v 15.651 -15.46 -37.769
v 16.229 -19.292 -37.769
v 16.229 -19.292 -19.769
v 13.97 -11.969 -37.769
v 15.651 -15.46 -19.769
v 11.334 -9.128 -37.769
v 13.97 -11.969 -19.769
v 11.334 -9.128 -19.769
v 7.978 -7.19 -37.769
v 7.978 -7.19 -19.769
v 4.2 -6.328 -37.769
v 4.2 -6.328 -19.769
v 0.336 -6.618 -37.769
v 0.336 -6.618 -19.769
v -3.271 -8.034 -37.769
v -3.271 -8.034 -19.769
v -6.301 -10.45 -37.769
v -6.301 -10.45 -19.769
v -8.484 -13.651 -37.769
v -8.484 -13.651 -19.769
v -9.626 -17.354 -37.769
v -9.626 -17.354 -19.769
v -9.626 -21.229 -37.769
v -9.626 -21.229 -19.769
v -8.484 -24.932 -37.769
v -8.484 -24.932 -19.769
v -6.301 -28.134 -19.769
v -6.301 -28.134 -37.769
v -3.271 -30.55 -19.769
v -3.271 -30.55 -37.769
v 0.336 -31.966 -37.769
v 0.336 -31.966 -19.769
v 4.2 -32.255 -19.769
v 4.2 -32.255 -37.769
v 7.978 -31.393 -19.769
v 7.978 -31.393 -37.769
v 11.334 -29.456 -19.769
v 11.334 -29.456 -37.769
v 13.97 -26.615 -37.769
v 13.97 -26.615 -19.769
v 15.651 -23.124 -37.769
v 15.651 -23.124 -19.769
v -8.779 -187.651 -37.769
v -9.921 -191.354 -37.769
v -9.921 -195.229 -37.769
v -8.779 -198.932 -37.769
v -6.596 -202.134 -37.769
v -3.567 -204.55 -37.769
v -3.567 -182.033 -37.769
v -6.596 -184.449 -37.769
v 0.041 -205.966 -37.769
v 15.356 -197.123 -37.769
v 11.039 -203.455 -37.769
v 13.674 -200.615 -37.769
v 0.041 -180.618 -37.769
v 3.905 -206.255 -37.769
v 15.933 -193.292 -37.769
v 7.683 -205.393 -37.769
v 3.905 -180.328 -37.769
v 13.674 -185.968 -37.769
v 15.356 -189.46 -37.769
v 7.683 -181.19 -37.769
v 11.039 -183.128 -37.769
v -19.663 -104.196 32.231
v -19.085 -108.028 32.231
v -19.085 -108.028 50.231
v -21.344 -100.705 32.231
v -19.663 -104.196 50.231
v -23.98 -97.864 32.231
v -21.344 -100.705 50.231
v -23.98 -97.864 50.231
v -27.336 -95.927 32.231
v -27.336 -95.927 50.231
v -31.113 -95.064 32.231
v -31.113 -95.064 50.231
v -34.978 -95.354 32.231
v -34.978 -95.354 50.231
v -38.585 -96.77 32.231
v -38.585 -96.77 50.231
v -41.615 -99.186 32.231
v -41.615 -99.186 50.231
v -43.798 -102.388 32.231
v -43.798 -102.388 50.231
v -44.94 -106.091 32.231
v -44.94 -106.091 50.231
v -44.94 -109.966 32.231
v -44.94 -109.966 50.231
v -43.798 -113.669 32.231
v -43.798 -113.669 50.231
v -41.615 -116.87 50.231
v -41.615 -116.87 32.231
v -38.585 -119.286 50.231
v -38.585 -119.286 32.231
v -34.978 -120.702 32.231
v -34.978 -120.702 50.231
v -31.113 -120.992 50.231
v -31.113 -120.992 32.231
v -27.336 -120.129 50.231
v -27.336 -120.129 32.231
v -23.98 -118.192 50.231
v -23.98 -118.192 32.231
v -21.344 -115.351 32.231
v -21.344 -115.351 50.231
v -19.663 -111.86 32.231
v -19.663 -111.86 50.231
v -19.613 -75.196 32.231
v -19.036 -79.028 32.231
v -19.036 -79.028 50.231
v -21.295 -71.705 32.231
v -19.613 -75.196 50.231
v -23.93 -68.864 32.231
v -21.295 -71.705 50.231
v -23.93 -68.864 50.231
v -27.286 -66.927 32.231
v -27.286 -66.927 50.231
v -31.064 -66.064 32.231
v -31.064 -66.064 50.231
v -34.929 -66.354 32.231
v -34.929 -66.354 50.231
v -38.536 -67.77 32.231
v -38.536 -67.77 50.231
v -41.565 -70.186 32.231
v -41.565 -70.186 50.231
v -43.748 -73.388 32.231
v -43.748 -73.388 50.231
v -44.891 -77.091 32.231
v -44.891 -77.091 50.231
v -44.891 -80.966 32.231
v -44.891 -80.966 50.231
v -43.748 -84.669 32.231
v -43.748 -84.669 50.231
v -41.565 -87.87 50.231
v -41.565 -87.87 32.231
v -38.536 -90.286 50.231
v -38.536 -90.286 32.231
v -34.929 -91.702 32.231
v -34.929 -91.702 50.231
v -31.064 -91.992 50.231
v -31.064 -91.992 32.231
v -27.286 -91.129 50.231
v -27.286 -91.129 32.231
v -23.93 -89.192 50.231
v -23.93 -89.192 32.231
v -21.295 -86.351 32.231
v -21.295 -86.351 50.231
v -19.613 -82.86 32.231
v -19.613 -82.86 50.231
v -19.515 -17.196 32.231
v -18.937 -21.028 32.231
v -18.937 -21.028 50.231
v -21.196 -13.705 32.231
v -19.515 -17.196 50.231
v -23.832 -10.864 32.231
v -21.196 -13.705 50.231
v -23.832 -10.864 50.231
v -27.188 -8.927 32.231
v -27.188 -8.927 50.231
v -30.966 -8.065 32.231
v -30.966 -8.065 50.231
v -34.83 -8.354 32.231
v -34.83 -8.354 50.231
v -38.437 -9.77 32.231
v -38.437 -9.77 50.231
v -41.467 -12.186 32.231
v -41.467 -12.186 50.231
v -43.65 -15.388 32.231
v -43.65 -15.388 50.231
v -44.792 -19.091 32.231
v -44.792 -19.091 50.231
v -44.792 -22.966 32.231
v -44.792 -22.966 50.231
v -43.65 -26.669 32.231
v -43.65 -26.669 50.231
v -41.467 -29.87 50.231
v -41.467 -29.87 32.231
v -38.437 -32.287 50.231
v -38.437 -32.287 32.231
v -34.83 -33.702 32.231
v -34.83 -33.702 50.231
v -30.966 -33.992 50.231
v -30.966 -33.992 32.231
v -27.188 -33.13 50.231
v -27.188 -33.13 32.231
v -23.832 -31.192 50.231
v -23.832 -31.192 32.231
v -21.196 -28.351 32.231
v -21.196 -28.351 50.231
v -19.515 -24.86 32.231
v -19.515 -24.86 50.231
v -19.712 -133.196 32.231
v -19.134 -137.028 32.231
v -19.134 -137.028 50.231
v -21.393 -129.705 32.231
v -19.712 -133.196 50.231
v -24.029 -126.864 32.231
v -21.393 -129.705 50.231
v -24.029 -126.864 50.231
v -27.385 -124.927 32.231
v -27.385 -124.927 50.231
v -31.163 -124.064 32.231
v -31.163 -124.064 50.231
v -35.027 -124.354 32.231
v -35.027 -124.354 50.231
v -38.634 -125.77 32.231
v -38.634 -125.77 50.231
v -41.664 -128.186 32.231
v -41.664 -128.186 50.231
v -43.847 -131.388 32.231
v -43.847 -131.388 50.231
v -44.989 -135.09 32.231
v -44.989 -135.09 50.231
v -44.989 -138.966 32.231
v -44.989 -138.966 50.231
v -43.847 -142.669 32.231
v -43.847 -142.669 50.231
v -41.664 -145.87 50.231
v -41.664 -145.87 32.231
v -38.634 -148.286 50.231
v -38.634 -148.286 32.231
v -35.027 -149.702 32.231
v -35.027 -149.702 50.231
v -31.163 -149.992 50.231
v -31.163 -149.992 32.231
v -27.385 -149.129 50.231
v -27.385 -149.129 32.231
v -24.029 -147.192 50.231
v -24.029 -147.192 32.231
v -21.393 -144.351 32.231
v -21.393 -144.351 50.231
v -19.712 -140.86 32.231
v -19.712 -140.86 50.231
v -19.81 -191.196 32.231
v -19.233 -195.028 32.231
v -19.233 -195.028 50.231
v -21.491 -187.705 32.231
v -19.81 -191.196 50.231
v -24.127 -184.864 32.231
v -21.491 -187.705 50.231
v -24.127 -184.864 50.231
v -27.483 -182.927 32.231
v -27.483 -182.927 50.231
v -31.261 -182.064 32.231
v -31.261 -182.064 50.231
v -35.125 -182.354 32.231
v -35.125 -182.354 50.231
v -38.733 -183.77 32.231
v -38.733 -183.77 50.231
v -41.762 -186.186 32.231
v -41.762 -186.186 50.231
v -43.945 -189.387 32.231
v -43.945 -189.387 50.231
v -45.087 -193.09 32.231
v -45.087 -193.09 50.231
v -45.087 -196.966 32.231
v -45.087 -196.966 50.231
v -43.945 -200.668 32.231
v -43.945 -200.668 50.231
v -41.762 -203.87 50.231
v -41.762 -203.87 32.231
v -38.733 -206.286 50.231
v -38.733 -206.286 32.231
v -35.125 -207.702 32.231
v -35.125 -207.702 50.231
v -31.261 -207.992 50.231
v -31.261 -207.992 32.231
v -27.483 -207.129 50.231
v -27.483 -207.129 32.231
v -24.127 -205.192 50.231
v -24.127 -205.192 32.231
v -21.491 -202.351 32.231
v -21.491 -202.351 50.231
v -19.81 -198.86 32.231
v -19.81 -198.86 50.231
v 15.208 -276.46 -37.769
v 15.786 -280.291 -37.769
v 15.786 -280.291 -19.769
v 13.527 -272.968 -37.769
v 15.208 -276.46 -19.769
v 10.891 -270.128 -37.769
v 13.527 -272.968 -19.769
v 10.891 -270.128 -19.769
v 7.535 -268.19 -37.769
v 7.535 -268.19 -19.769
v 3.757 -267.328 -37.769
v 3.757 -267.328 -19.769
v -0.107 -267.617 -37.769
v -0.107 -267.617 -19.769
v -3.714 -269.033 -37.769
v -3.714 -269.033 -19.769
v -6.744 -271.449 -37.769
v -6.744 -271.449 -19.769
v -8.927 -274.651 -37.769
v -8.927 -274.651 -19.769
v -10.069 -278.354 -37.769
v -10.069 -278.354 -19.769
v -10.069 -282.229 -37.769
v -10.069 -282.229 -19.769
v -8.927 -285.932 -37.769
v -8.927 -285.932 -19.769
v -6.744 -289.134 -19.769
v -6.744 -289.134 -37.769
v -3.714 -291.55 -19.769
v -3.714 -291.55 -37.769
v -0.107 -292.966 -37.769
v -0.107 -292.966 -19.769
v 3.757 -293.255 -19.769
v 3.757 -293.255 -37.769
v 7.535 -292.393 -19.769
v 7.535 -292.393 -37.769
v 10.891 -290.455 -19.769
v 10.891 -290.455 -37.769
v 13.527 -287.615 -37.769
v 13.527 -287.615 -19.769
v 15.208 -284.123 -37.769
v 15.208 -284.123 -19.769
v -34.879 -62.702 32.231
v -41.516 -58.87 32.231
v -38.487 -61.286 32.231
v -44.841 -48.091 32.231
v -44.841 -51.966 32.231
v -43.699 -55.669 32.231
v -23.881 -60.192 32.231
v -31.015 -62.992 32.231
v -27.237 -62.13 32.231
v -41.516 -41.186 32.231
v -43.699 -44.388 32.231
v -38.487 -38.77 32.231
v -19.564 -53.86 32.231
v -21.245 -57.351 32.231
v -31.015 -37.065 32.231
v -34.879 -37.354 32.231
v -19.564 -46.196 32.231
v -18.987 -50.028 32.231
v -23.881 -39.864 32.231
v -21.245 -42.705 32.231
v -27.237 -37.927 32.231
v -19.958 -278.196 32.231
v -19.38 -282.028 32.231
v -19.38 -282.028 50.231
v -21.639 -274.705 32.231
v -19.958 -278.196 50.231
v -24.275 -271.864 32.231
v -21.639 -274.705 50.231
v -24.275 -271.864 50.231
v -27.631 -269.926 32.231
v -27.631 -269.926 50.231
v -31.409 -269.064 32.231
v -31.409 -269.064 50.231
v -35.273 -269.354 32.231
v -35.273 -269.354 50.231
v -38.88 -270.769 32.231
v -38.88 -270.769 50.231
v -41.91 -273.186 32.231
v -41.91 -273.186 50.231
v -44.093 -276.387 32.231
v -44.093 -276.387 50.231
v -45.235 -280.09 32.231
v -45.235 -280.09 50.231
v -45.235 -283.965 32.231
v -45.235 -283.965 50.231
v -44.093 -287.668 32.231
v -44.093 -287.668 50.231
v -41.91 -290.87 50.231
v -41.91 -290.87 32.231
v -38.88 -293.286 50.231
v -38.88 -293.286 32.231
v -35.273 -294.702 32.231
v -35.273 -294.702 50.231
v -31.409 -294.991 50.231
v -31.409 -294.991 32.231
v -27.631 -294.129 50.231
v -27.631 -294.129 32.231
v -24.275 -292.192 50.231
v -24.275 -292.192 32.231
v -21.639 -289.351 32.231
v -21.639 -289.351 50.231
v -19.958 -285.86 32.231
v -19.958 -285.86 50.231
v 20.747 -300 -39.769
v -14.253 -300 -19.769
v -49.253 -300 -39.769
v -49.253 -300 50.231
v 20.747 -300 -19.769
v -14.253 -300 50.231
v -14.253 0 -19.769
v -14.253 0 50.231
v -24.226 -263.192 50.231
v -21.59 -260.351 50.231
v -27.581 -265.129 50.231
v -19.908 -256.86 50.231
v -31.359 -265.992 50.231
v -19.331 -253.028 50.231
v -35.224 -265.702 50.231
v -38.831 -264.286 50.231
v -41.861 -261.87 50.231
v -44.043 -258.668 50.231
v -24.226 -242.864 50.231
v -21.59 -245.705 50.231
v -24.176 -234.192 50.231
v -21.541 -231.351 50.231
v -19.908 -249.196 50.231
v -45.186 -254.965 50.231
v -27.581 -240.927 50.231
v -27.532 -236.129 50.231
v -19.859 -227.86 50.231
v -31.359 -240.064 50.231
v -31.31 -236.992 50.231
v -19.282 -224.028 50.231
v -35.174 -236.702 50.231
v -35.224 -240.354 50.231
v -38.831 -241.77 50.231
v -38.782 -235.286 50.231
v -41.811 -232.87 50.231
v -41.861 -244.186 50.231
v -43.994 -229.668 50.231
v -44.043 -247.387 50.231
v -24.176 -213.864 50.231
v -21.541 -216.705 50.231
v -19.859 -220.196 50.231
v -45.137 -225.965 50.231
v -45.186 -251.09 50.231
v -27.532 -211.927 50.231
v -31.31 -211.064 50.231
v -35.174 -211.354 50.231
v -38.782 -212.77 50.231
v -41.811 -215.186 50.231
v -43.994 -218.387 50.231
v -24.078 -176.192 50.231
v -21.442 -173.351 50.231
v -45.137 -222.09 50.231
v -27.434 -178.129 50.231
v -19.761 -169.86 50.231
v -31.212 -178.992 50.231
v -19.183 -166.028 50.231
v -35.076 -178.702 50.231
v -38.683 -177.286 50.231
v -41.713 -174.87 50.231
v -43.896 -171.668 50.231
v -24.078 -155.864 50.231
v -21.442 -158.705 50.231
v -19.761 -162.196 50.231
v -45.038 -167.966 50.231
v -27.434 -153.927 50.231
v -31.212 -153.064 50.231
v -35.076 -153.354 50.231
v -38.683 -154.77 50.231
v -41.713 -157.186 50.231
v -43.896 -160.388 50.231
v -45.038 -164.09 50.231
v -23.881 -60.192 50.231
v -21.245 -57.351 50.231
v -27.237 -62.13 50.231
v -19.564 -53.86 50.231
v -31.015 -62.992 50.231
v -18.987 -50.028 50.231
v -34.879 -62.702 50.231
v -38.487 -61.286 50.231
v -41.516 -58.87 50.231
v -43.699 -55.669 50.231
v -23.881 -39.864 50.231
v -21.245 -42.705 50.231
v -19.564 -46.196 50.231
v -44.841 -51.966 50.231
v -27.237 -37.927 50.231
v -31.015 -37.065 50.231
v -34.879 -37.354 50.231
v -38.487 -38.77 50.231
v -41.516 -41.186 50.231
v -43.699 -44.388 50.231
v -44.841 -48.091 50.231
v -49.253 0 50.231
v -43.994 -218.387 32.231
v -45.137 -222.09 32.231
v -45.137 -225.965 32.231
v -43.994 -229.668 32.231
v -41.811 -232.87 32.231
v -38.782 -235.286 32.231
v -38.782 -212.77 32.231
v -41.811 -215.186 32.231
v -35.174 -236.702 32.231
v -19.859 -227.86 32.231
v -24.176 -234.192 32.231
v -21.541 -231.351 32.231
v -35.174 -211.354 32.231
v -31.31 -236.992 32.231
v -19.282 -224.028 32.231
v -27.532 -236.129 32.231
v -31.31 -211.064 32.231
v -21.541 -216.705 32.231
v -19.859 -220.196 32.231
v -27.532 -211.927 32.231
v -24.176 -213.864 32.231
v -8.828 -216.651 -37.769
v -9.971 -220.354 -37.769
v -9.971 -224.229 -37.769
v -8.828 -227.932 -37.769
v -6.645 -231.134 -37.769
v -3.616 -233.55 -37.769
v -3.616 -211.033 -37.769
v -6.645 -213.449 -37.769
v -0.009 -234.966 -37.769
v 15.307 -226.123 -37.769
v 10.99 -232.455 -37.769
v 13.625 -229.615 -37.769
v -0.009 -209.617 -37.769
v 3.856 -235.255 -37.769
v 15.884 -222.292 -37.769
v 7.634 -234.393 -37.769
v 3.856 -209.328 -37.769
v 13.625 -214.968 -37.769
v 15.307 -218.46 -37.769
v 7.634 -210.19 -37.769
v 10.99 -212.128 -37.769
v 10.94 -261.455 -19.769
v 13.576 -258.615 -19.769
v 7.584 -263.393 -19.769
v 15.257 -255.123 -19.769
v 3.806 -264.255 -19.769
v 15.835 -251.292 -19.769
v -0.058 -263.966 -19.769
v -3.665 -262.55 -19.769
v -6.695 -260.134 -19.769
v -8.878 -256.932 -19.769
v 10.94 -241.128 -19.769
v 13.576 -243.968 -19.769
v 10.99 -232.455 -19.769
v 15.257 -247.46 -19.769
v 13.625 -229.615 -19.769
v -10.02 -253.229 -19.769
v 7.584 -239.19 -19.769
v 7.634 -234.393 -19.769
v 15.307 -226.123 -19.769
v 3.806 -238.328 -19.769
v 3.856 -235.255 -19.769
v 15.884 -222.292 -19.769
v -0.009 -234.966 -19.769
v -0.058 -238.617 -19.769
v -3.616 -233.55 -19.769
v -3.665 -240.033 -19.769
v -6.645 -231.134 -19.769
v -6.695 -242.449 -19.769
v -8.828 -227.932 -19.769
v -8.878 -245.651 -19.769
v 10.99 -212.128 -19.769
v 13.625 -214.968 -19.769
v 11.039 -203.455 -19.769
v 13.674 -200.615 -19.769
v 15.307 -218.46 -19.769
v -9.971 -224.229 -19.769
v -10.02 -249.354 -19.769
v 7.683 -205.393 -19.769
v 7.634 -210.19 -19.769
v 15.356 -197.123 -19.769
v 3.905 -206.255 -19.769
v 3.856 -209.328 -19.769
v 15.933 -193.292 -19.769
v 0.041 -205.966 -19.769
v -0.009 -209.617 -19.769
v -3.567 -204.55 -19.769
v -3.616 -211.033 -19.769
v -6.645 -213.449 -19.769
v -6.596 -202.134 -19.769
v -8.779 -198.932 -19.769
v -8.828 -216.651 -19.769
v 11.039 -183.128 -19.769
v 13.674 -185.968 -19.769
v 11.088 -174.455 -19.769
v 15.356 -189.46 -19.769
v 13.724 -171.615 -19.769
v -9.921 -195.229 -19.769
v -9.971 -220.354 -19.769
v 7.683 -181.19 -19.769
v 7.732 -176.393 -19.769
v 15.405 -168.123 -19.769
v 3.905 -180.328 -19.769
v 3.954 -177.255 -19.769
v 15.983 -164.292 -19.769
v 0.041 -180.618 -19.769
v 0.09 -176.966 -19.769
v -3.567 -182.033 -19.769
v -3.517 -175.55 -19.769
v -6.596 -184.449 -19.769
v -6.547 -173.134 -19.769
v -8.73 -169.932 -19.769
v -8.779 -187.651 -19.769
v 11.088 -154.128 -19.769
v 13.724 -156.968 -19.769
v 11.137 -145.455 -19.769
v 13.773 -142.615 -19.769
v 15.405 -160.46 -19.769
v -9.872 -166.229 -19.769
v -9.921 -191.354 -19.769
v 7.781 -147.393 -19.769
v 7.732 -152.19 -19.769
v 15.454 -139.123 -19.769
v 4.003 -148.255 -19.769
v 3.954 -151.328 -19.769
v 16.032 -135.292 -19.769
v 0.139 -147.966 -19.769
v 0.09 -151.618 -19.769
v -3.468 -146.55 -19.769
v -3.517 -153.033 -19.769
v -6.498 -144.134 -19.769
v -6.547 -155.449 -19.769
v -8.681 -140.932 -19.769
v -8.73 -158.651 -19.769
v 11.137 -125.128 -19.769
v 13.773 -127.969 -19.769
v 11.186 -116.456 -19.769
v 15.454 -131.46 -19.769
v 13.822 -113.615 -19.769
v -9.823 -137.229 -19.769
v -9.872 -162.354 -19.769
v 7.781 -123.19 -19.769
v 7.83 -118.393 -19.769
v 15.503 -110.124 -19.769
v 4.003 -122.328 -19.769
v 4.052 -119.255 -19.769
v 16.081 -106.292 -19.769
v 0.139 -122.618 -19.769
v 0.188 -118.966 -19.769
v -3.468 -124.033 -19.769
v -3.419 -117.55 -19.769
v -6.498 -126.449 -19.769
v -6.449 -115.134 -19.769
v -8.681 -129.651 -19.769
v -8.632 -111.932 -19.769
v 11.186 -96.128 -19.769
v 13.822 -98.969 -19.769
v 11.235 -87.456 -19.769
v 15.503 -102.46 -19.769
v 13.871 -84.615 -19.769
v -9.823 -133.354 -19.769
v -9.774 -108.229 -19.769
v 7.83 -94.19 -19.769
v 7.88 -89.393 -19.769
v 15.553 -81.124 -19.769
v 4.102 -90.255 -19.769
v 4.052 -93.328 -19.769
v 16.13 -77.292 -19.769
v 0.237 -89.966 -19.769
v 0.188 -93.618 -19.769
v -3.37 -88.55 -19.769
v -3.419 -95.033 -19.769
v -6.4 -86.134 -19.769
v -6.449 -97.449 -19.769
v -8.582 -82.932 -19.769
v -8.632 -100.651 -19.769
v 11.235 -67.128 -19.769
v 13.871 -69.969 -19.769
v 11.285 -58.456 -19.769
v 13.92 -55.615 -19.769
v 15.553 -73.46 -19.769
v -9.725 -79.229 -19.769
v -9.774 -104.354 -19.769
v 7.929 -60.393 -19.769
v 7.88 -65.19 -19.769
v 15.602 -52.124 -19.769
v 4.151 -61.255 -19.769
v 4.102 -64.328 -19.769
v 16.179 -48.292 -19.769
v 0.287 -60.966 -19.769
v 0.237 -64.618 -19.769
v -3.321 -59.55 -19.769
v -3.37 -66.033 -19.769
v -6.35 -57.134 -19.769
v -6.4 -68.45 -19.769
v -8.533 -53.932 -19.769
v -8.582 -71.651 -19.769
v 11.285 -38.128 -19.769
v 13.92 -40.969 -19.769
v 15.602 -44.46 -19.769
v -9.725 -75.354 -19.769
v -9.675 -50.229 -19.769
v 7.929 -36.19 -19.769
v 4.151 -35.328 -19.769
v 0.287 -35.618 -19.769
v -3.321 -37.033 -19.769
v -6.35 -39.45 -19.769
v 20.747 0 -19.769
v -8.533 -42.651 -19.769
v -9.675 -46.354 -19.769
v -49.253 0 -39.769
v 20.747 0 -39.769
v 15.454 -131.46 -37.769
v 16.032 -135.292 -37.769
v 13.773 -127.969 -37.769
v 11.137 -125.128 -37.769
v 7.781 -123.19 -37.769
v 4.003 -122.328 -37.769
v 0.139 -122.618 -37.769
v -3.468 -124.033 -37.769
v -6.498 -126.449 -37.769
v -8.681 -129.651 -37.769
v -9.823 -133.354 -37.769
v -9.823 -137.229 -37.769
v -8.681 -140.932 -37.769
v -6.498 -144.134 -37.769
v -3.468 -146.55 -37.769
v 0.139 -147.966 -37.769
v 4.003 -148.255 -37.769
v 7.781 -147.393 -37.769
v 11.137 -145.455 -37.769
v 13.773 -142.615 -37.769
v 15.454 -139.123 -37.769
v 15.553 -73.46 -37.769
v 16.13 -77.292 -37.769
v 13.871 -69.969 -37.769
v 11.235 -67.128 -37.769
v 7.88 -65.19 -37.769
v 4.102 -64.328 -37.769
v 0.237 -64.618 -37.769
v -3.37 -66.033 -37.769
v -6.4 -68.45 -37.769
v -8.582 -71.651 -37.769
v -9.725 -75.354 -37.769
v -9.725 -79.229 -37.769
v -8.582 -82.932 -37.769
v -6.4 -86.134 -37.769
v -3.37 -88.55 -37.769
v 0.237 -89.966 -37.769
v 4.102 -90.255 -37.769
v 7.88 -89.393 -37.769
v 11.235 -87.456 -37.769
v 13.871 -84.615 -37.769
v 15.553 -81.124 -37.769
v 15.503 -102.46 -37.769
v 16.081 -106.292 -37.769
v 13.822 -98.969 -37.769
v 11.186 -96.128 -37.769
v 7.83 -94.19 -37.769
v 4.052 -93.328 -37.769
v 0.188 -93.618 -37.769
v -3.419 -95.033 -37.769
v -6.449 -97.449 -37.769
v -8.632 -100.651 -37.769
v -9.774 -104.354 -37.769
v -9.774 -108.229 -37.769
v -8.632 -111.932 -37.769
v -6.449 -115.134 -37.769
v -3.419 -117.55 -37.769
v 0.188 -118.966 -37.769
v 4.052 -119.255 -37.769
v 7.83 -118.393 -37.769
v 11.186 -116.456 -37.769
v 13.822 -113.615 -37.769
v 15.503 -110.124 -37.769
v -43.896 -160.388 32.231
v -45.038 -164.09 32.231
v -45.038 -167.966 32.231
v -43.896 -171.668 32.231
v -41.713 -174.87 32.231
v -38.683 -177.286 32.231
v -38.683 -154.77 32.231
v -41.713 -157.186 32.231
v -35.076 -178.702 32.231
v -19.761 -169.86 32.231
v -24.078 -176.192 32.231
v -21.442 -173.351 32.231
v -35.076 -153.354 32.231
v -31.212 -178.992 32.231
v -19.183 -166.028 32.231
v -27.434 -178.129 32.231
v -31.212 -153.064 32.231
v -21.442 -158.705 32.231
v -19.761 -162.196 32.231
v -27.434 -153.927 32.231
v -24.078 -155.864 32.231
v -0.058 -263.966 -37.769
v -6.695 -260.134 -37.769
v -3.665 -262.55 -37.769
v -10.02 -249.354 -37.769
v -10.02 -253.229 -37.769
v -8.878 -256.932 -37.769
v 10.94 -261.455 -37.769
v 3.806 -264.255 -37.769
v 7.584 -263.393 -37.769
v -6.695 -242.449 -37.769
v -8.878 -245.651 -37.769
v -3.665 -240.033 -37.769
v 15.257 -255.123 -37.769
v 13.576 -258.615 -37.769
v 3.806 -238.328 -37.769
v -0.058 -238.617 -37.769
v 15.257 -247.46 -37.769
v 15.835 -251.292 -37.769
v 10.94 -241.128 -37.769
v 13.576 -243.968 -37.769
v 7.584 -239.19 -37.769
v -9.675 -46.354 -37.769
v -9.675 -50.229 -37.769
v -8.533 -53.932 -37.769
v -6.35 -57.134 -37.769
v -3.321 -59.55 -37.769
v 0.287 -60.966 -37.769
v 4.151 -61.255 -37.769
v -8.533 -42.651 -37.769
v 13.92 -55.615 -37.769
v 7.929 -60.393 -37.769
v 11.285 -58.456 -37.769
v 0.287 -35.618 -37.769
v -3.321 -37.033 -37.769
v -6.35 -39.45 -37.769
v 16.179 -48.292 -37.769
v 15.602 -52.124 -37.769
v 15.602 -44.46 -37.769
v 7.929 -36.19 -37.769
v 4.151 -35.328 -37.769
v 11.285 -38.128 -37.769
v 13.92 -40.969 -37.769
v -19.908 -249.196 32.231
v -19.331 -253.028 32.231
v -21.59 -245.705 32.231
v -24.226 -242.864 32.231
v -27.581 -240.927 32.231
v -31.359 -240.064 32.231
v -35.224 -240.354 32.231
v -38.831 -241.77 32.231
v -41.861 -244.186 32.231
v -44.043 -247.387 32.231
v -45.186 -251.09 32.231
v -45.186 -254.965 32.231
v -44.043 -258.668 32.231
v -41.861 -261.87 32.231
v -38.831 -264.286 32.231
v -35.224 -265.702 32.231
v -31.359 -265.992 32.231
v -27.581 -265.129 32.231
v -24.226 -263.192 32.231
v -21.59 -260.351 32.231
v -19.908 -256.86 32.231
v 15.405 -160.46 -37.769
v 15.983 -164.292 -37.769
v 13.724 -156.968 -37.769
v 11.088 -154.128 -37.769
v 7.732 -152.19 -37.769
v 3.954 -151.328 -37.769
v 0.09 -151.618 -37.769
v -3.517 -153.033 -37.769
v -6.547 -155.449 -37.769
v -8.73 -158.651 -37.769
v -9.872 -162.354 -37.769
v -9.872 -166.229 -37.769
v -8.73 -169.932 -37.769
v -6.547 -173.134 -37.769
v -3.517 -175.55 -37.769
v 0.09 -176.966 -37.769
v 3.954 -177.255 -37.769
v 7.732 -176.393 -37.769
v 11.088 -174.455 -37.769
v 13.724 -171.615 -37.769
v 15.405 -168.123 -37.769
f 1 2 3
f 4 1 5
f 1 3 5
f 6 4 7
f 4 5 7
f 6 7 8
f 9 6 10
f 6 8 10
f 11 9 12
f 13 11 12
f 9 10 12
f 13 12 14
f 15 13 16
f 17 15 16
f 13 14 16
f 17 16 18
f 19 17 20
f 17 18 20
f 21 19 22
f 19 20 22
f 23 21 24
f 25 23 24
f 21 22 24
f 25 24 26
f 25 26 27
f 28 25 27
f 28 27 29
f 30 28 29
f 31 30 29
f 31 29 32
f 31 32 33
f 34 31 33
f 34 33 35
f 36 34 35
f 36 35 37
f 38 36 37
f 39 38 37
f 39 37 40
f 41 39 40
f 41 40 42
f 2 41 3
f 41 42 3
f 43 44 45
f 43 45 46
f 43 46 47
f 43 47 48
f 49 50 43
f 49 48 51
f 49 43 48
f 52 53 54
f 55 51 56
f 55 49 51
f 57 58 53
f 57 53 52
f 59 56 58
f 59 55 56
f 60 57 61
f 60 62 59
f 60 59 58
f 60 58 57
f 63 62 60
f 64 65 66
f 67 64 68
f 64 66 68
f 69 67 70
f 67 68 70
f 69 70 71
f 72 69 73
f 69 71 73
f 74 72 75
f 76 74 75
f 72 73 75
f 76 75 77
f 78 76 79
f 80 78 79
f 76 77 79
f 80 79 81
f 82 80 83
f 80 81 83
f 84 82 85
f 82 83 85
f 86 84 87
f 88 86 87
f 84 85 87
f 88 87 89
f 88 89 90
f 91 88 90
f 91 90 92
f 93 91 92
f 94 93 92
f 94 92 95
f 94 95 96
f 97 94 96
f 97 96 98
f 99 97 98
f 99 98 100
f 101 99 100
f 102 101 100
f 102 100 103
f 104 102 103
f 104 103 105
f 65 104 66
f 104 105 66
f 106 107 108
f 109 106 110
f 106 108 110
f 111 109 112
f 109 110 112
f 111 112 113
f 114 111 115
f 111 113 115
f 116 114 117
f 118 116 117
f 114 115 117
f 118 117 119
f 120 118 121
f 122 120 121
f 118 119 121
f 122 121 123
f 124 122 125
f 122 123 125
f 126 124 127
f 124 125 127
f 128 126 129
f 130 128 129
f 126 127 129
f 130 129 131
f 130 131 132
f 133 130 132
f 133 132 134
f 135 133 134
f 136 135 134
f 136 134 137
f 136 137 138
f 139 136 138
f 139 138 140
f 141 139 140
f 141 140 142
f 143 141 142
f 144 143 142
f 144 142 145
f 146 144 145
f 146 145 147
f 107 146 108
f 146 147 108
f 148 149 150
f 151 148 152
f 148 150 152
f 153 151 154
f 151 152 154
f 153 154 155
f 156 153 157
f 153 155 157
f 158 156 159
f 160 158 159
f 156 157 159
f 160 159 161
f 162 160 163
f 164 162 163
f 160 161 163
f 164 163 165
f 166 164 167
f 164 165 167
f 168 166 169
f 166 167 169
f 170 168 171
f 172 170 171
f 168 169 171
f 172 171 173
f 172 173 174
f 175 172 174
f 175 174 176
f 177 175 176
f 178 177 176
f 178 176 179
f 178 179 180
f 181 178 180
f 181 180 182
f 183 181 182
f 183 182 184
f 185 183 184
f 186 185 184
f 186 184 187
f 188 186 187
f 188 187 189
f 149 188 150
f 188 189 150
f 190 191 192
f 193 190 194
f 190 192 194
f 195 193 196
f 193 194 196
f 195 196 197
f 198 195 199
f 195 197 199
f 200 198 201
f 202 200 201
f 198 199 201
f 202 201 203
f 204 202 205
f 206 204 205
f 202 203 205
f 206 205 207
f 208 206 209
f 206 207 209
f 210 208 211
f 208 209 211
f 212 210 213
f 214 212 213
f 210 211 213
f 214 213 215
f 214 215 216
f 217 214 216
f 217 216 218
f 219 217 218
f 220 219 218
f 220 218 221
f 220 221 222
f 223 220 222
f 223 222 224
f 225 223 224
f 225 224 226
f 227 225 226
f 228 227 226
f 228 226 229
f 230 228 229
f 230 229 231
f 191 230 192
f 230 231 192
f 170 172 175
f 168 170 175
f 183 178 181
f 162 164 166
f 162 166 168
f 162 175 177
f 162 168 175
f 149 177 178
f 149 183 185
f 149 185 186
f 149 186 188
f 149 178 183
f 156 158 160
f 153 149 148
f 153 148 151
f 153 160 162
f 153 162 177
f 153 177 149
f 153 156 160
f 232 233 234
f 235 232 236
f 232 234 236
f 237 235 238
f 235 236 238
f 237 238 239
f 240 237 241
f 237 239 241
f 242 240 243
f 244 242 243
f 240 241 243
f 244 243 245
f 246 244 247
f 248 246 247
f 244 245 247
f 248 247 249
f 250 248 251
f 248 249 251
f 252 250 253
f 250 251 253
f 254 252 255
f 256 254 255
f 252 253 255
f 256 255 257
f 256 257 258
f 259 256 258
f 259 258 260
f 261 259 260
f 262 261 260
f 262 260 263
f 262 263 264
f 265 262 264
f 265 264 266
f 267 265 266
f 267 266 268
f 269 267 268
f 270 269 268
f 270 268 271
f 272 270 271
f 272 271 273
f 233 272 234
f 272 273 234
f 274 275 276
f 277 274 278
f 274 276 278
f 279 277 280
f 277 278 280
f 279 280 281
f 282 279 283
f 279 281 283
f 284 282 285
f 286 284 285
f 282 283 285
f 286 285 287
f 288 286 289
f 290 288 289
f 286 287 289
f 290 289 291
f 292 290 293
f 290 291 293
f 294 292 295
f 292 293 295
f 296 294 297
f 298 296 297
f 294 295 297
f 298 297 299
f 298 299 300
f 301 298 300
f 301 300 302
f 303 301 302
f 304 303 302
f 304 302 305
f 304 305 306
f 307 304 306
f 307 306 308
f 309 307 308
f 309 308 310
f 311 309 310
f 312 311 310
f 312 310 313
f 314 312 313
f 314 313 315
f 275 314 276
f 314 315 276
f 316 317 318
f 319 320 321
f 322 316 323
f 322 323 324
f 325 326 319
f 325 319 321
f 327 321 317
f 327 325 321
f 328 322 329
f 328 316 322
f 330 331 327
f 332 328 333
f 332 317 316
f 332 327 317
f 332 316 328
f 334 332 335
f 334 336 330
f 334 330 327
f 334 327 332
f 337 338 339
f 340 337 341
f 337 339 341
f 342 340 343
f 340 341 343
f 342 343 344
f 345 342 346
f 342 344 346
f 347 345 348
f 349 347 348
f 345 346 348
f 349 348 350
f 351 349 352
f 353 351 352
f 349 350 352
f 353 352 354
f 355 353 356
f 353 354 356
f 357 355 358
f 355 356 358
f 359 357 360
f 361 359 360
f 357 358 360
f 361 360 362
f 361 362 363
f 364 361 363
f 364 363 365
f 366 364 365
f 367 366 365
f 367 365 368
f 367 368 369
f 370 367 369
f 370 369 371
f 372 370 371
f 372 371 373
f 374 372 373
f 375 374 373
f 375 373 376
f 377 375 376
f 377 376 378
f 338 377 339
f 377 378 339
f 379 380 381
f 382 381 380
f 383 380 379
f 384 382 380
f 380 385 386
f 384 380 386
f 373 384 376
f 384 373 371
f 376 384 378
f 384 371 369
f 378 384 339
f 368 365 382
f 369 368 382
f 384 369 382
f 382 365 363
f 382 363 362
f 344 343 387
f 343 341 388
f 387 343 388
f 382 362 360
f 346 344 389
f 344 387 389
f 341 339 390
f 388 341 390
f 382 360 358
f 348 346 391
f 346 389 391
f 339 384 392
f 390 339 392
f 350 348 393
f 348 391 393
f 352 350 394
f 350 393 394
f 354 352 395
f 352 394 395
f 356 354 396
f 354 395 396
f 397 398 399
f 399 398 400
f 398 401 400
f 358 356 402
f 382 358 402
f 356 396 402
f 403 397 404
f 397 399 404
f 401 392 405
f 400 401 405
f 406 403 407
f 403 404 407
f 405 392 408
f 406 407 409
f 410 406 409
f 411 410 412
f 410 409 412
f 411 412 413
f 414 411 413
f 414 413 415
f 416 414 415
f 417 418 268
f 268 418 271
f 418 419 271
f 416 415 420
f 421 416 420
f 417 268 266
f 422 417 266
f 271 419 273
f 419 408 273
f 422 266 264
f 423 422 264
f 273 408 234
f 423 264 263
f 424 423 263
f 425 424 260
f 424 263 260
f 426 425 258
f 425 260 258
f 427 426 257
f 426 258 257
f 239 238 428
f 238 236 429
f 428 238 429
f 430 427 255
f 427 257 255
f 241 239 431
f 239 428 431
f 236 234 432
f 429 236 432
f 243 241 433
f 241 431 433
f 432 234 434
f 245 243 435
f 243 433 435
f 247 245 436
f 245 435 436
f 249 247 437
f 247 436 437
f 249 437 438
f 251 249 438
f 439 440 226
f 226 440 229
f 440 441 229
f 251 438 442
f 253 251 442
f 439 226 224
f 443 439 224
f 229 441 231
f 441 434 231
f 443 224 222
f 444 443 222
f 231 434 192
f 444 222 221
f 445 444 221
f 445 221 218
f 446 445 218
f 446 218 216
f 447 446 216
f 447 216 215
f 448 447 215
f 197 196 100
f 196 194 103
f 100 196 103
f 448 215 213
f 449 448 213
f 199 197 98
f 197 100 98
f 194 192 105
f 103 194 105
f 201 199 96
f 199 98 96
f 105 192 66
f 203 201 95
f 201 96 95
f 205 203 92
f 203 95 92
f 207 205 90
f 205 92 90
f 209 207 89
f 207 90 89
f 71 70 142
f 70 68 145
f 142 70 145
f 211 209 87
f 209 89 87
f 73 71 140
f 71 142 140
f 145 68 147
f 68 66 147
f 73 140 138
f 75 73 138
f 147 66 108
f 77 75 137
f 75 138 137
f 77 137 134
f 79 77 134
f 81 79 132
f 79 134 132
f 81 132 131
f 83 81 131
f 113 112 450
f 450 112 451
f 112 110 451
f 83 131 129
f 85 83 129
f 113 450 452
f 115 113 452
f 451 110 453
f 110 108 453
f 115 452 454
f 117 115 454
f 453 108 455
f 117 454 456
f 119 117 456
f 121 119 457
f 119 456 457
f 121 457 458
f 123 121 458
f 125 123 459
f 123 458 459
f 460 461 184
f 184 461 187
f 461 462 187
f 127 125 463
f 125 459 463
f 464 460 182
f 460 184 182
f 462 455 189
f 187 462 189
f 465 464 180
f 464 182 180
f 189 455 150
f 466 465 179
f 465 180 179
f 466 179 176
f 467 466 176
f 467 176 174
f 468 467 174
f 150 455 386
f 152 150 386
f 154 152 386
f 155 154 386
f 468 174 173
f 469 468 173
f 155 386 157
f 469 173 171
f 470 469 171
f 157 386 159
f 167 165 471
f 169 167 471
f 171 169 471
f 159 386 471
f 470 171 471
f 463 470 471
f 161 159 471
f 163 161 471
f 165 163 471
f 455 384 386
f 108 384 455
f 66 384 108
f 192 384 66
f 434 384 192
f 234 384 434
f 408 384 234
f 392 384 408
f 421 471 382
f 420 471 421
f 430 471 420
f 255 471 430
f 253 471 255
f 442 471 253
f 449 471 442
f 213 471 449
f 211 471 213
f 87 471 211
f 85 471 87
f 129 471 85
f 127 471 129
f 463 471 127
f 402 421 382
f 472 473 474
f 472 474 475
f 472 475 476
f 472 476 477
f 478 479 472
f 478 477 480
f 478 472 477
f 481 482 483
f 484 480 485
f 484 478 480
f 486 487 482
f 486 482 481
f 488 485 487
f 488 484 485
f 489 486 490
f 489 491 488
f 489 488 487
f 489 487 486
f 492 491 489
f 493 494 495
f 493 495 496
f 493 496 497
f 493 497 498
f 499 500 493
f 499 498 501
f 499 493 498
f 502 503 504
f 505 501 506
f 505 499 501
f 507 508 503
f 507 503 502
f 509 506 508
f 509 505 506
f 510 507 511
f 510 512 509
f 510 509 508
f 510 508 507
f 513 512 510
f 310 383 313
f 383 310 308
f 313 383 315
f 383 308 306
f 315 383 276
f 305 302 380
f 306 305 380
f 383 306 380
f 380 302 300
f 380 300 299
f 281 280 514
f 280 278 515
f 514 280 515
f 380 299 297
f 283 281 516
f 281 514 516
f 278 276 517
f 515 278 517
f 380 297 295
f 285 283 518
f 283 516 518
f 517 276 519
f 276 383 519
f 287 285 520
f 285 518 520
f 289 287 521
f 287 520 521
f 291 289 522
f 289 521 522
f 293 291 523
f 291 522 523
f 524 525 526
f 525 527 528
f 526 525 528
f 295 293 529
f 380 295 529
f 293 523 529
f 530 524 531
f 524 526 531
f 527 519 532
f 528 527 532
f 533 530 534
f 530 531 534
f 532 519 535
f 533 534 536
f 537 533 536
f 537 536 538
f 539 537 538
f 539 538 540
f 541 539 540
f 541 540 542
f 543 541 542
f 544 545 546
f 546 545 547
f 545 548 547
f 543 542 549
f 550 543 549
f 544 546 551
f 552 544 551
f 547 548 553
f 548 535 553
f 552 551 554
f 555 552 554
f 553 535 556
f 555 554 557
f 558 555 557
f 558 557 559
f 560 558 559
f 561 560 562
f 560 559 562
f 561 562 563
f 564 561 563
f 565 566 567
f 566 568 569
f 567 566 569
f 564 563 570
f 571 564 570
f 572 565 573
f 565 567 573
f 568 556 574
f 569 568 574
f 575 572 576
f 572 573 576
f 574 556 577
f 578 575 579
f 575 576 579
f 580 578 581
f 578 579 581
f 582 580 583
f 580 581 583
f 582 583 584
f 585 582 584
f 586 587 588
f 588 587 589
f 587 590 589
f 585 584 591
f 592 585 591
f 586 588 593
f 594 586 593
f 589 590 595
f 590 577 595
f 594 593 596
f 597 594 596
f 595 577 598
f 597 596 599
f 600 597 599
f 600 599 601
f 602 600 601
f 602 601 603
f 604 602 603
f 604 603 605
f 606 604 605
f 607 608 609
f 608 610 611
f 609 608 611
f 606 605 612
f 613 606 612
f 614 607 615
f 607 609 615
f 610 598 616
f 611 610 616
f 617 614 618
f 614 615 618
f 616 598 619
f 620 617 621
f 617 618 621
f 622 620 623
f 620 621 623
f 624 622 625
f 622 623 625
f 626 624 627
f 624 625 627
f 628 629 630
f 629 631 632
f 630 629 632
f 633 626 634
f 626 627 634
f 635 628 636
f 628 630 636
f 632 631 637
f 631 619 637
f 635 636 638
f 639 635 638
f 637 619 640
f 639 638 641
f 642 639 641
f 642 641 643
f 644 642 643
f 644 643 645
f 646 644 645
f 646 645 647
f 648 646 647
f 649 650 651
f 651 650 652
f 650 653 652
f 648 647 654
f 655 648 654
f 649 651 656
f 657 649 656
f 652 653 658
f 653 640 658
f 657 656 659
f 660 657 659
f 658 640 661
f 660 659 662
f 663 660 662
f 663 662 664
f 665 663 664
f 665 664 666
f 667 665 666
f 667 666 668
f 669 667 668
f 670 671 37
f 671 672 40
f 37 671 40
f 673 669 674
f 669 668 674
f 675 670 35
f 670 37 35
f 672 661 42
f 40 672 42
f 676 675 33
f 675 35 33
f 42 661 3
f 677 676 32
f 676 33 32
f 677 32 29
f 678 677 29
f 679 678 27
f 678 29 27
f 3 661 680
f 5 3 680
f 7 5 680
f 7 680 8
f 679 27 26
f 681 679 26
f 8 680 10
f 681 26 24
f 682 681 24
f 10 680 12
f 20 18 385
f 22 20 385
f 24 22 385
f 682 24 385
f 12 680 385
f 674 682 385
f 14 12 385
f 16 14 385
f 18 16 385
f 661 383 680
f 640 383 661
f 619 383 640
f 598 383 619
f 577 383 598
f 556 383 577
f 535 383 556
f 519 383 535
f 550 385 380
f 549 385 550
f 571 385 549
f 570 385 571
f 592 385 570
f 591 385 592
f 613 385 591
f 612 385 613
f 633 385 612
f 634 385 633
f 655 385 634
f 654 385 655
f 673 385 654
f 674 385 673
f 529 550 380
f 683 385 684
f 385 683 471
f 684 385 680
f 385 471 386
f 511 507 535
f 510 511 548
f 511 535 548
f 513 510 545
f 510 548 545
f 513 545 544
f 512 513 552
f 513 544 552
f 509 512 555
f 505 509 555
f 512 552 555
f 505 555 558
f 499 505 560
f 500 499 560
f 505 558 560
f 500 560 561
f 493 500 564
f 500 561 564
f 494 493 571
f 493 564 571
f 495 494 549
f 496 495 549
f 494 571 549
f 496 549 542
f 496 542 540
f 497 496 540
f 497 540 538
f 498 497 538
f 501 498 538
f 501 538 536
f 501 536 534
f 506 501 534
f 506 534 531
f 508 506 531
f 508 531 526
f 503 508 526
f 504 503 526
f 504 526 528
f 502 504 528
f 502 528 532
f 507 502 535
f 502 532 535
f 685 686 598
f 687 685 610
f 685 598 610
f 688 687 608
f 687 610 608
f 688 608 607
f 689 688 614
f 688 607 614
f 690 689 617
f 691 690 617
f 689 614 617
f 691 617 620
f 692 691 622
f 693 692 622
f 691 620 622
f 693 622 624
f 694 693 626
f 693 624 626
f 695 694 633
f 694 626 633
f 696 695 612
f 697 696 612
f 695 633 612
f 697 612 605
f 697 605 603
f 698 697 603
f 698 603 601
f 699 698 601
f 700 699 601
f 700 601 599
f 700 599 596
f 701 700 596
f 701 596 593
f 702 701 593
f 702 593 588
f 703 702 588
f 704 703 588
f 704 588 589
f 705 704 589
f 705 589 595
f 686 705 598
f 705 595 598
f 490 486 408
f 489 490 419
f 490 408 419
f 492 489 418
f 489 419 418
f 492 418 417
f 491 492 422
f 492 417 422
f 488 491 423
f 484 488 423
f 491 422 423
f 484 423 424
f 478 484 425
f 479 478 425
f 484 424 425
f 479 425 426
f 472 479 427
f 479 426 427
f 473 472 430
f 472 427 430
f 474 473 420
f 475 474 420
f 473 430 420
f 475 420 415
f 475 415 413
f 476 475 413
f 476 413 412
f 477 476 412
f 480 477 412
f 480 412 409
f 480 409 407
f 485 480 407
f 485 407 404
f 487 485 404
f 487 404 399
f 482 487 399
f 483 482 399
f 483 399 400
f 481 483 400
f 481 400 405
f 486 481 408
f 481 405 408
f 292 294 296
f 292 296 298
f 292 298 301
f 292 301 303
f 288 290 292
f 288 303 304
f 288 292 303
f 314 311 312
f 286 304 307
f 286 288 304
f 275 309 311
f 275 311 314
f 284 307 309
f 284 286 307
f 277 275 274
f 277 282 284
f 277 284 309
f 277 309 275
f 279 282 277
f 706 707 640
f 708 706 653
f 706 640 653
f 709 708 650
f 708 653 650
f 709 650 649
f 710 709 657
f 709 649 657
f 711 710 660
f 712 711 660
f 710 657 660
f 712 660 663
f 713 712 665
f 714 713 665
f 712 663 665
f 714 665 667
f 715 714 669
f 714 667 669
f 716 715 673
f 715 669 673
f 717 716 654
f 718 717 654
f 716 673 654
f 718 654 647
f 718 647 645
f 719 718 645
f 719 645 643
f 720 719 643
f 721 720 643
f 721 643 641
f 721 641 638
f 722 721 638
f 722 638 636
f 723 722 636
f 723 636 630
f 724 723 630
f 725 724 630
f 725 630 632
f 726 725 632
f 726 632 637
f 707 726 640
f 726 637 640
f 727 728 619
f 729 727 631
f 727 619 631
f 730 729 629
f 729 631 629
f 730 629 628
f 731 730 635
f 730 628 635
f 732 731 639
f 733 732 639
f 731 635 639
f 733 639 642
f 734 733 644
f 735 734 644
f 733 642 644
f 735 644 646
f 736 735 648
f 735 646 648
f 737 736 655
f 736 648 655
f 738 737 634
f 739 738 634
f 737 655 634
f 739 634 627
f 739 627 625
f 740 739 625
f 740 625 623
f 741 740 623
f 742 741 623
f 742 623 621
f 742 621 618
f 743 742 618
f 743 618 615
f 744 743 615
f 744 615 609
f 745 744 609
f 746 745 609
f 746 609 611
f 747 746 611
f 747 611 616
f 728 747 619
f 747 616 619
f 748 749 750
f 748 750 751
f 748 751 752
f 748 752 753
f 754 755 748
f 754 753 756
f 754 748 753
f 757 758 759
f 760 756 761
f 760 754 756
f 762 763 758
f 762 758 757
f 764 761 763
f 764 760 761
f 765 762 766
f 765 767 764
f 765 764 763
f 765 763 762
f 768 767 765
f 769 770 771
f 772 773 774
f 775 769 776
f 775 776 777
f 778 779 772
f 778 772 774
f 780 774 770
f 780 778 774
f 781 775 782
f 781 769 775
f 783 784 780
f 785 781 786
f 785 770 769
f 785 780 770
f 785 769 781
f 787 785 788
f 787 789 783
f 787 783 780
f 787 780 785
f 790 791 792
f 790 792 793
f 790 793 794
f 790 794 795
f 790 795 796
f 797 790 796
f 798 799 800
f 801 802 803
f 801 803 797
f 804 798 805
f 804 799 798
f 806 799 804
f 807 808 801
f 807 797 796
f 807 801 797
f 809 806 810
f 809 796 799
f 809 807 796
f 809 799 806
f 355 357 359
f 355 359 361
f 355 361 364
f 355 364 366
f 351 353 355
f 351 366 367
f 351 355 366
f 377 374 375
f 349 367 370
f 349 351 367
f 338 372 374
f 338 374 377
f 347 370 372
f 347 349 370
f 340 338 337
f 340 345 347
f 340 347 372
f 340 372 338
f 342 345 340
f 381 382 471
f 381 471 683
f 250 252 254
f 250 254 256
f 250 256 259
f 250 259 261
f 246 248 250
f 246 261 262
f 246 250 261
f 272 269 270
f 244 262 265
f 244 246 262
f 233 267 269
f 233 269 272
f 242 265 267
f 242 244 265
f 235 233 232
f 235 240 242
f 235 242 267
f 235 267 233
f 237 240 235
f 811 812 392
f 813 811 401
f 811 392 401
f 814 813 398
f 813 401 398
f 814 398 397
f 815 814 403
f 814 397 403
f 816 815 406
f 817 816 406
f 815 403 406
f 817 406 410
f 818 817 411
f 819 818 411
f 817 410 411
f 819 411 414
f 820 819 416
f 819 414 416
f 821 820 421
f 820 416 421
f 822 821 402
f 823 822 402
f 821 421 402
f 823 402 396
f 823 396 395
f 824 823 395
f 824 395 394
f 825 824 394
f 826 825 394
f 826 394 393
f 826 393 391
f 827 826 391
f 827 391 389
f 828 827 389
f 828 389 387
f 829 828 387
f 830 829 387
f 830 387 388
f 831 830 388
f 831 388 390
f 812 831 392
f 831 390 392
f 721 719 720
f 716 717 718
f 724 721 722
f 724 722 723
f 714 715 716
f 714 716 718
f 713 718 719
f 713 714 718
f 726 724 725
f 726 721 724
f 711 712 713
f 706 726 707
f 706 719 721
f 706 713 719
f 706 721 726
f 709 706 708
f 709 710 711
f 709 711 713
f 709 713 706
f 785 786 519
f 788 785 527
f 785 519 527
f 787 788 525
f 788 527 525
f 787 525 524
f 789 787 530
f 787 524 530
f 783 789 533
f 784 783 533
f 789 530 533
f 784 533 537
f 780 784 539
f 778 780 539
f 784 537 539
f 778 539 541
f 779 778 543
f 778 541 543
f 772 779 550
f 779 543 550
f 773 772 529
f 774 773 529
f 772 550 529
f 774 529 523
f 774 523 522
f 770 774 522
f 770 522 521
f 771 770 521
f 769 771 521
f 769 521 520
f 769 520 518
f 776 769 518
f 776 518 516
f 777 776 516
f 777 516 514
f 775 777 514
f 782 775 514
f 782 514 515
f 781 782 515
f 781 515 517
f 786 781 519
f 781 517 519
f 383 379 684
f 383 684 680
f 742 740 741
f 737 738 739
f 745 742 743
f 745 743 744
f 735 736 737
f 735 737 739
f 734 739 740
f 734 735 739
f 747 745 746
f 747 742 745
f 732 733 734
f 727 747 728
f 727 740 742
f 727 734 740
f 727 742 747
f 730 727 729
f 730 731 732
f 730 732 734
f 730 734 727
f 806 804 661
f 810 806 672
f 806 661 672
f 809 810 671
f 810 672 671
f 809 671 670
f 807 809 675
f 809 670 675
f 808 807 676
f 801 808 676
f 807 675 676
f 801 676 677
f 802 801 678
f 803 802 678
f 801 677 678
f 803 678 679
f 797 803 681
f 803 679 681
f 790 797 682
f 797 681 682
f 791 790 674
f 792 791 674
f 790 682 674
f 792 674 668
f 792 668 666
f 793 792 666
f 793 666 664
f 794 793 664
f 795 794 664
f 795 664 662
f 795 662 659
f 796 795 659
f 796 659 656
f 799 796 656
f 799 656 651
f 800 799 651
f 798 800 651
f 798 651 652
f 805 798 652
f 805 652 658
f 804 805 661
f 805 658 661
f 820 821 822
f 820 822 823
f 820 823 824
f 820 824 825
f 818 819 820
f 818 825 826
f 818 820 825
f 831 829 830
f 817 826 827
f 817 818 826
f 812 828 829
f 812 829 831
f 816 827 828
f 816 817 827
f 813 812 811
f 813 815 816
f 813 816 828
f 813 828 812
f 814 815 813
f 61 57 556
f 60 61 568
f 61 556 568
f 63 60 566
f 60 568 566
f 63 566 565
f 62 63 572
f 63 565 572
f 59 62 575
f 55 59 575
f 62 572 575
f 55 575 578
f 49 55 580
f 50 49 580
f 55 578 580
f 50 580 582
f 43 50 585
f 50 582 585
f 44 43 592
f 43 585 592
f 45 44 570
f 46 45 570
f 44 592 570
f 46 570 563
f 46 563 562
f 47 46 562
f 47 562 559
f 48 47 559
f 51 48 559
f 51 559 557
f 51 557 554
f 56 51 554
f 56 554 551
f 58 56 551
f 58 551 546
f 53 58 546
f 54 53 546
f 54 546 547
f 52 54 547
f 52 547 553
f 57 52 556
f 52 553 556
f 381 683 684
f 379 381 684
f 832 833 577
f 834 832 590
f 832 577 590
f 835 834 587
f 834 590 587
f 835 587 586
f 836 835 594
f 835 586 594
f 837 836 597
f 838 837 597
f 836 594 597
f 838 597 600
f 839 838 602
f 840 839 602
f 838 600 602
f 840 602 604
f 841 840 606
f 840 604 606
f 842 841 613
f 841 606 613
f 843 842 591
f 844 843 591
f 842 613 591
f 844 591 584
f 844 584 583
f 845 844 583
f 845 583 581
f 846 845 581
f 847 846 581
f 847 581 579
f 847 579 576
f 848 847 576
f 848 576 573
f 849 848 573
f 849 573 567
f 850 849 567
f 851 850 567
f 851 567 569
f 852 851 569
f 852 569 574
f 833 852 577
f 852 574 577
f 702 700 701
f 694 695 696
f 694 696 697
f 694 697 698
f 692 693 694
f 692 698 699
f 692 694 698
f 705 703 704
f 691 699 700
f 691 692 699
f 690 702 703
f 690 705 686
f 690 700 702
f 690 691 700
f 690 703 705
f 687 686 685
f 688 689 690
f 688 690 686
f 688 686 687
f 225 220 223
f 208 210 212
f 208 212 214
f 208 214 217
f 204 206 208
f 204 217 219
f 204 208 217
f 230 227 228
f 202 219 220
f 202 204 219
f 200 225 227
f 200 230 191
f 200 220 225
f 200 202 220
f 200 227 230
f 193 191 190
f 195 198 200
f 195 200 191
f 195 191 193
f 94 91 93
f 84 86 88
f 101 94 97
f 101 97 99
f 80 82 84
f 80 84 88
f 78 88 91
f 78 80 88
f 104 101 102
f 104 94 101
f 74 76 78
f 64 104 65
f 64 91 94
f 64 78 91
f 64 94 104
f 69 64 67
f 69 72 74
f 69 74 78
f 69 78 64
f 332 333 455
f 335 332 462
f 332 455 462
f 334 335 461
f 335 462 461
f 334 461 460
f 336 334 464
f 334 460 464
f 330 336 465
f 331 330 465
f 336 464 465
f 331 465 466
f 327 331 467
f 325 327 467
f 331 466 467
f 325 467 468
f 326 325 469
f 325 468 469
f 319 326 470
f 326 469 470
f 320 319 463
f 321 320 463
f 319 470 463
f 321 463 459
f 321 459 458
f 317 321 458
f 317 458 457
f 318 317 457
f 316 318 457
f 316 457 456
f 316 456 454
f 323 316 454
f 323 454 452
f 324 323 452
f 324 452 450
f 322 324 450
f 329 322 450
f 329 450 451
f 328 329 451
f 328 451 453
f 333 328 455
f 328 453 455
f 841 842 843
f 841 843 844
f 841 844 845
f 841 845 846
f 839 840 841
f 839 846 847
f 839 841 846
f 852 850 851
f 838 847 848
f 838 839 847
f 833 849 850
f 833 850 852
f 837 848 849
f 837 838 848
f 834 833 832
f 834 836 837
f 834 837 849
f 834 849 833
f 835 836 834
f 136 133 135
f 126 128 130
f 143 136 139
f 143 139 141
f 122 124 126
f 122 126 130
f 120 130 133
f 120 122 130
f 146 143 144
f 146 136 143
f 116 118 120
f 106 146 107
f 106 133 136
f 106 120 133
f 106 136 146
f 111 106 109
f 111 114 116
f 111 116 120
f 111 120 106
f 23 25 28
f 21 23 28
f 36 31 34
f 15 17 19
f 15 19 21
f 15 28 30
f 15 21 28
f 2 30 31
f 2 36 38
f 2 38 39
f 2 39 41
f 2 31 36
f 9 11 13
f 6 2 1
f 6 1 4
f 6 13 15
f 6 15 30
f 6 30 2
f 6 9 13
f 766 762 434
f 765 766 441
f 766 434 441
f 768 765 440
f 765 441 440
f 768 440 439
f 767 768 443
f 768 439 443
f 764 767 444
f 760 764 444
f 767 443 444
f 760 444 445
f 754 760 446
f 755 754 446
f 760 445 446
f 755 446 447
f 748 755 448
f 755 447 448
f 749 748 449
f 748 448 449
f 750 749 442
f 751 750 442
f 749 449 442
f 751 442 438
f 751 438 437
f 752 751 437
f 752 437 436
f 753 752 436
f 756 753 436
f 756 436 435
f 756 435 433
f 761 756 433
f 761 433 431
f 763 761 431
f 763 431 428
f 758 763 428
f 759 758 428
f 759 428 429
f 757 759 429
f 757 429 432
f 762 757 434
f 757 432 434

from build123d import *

# Parameters (mm, degrees)
F1_DEPTH = 300
F2_R     = 13
F4_DEPTH = 18
F3_R     = 13
F5_DEPTH = 18


with BuildPart() as f1:
    # F0 (on Front) → F1 (new body)
    with BuildSketch(Plane.XZ):
        Polygon((-14.253071, 50.231077), (-49.253071, 50.231077), (-49.253071, -39.768923), (20.746929, -39.768923), (20.746929, -19.768923), (-14.253071, -19.768923), align=None)
    extrude(amount=F1_DEPTH)

    # F2 (on face) → F4 (cut)
    with BuildSketch(Plane.XY.offset(-19.768923)):
        with Locations((2.785809, -280.291462)):
            Circle(F2_R)
        with Locations((2.834997, -251.291504)):
            Circle(F2_R)
        with Locations((2.884185, -222.291546)):
            Circle(F2_R)
        with Locations((2.933373, -193.291588)):
            Circle(F2_R)
        with Locations((2.982561, -164.291629)):
            Circle(F2_R)
        with Locations((3.031749, -135.291671)):
            Circle(F2_R)
        with Locations((3.080937, -106.291713)):
            Circle(F2_R)
        with Locations((3.130125, -77.291754)):
            Circle(F2_R)
        with Locations((3.179313, -48.291796)):
            Circle(F2_R)
        with Locations((3.228501, -19.291838)):
            Circle(F2_R)
    extrude(amount=-F4_DEPTH, mode=Mode.SUBTRACT)

    # F3 (on face) → F5 (cut)
    with BuildSketch(Plane.XY.offset(50.231077)):
        with Locations((-32.380091, -282.027827)):
            Circle(F3_R)
        with Locations((-32.330904, -253.027869)):
            Circle(F3_R)
        with Locations((-32.281717, -224.027911)):
            Circle(F3_R)
        with Locations((-32.232531, -195.027952)):
            Circle(F3_R)
        with Locations((-32.183344, -166.027994)):
            Circle(F3_R)
        with Locations((-32.134158, -137.028036)):
            Circle(F3_R)
        with Locations((-32.084971, -108.028078)):
            Circle(F3_R)
        with Locations((-32.035784, -79.028119)):
            Circle(F3_R)
        with Locations((-31.986598, -50.028161)):
            Circle(F3_R)
        with Locations((-31.937411, -21.028203)):
            Circle(F3_R)
    extrude(amount=-F5_DEPTH, mode=Mode.SUBTRACT)


solid = f1.part
